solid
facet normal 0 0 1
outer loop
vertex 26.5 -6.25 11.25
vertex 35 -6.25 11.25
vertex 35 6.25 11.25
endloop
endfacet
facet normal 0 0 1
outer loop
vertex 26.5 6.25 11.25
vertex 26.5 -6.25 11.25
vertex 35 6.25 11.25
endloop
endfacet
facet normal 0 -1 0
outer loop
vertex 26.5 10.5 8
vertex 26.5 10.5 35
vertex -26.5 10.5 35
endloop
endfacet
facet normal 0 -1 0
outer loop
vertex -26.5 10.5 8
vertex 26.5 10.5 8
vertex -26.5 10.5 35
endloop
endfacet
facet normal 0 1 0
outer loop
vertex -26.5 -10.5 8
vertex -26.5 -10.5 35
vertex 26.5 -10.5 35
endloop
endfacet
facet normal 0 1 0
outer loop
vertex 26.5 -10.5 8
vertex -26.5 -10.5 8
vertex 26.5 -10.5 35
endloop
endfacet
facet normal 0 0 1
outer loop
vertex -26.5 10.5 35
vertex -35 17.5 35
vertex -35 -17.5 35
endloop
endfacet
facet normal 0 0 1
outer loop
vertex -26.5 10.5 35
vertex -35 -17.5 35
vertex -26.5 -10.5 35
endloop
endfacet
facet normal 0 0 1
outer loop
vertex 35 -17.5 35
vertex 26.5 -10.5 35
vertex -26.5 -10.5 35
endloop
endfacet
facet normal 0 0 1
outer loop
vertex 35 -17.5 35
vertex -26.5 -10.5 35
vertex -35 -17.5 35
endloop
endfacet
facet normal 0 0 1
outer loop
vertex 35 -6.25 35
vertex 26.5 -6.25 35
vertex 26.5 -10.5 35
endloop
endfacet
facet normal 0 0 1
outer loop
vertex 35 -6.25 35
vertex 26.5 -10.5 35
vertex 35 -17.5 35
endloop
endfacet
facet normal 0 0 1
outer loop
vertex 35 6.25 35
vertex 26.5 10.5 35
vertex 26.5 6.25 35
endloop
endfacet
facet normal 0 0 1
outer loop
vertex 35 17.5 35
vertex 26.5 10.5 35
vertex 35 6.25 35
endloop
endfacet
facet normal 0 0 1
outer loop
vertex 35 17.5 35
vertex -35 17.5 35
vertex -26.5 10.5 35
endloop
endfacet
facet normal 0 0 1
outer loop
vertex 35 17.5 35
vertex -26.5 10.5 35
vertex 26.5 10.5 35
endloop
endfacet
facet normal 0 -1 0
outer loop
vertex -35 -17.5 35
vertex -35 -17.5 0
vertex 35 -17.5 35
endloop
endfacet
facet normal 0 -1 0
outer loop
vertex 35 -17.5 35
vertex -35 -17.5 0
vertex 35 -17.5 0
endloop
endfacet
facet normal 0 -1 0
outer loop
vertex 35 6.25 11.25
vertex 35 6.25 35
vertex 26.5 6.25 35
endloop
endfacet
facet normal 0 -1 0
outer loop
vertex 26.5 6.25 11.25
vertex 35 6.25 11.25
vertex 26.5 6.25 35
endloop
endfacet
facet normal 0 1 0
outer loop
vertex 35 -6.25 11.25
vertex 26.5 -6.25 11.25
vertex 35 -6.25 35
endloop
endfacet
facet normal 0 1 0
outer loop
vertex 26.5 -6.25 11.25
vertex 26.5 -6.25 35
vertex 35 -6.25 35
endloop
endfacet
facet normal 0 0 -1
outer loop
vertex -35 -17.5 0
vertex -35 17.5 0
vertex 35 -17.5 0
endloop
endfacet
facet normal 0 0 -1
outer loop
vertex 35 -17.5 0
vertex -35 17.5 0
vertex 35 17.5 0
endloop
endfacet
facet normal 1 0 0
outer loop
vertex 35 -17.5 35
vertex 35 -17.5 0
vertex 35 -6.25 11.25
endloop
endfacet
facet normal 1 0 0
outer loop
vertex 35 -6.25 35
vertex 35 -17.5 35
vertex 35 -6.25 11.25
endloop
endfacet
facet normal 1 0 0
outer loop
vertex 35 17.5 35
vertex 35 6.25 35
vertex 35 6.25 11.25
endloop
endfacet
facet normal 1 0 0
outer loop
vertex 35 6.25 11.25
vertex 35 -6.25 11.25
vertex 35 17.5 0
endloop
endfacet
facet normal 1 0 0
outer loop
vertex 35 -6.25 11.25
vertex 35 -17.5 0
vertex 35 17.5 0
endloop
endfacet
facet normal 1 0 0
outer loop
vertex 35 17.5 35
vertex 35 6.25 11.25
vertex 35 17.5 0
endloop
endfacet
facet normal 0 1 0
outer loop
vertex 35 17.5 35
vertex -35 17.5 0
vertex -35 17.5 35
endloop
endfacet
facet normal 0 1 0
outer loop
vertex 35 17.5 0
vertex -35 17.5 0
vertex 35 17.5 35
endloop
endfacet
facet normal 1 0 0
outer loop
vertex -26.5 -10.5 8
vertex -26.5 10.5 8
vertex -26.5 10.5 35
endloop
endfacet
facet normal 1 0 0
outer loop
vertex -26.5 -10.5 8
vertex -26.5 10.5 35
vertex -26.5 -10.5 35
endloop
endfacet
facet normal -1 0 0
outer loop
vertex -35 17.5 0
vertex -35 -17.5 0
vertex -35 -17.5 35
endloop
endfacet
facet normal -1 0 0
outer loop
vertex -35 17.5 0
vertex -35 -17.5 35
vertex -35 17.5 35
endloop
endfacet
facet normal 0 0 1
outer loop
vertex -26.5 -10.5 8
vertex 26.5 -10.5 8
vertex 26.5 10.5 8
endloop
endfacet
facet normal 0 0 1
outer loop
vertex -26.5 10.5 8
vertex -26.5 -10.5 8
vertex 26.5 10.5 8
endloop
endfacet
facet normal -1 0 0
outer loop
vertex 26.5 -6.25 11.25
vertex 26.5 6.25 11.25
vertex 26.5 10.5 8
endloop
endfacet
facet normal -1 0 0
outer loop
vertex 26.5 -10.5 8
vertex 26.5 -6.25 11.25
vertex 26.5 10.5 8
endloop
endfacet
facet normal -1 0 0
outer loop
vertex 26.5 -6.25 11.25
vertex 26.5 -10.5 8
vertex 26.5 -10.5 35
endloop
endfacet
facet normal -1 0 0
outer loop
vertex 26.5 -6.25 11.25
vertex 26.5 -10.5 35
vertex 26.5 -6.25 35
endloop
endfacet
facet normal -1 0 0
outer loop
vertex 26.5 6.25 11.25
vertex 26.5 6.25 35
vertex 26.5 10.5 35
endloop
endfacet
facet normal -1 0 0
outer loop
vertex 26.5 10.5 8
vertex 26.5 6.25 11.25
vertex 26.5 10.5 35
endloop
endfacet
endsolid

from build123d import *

# Parameters (mm, degrees)
F0_W     = 70
F0_H     = 35
F1_DEPTH = 35
F2_W     = 21
F2_H     = 19
F3_DEPTH = 26.5
F4_W     = 12.5
F4_H     = 12.5
F5_DEPTH = 10
F7_DEPTH = 12


with BuildPart() as f1:
    # F0 (on Top) → F1 (new body)
    with BuildSketch(Plane.XY):
        Rectangle(F0_W, F0_H)
    extrude(amount=F1_DEPTH)

    # F2 (on Right) → F3 (cut, symmetric)
    with BuildSketch(Plane.YZ):
        with Locations((0, 17.5)):
            Rectangle(F2_W, F2_H)
    extrude(amount=F3_DEPTH, both=True, mode=Mode.SUBTRACT)

    # F4 (on face) → F5 (cut)
    with BuildSketch(Plane.YZ.offset(35)):
        with Locations((0, 17.5)):
            Rectangle(F4_W, F4_H)
    extrude(amount=-F5_DEPTH, mode=Mode.SUBTRACT)

    # F6 (on face) → F7 (cut)
    with BuildSketch(Plane.XY.offset(35)):
        Polygon((26.5, 10.5), (-26.5, 10.5), (-26.5, -10.5), (26.5, -10.5), (26.5, -6.25), (35, -6.25), (35, 6.25), (26.5, 6.25), align=None)
    extrude(amount=-F7_DEPTH, mode=Mode.SUBTRACT)


solid = f1.part
